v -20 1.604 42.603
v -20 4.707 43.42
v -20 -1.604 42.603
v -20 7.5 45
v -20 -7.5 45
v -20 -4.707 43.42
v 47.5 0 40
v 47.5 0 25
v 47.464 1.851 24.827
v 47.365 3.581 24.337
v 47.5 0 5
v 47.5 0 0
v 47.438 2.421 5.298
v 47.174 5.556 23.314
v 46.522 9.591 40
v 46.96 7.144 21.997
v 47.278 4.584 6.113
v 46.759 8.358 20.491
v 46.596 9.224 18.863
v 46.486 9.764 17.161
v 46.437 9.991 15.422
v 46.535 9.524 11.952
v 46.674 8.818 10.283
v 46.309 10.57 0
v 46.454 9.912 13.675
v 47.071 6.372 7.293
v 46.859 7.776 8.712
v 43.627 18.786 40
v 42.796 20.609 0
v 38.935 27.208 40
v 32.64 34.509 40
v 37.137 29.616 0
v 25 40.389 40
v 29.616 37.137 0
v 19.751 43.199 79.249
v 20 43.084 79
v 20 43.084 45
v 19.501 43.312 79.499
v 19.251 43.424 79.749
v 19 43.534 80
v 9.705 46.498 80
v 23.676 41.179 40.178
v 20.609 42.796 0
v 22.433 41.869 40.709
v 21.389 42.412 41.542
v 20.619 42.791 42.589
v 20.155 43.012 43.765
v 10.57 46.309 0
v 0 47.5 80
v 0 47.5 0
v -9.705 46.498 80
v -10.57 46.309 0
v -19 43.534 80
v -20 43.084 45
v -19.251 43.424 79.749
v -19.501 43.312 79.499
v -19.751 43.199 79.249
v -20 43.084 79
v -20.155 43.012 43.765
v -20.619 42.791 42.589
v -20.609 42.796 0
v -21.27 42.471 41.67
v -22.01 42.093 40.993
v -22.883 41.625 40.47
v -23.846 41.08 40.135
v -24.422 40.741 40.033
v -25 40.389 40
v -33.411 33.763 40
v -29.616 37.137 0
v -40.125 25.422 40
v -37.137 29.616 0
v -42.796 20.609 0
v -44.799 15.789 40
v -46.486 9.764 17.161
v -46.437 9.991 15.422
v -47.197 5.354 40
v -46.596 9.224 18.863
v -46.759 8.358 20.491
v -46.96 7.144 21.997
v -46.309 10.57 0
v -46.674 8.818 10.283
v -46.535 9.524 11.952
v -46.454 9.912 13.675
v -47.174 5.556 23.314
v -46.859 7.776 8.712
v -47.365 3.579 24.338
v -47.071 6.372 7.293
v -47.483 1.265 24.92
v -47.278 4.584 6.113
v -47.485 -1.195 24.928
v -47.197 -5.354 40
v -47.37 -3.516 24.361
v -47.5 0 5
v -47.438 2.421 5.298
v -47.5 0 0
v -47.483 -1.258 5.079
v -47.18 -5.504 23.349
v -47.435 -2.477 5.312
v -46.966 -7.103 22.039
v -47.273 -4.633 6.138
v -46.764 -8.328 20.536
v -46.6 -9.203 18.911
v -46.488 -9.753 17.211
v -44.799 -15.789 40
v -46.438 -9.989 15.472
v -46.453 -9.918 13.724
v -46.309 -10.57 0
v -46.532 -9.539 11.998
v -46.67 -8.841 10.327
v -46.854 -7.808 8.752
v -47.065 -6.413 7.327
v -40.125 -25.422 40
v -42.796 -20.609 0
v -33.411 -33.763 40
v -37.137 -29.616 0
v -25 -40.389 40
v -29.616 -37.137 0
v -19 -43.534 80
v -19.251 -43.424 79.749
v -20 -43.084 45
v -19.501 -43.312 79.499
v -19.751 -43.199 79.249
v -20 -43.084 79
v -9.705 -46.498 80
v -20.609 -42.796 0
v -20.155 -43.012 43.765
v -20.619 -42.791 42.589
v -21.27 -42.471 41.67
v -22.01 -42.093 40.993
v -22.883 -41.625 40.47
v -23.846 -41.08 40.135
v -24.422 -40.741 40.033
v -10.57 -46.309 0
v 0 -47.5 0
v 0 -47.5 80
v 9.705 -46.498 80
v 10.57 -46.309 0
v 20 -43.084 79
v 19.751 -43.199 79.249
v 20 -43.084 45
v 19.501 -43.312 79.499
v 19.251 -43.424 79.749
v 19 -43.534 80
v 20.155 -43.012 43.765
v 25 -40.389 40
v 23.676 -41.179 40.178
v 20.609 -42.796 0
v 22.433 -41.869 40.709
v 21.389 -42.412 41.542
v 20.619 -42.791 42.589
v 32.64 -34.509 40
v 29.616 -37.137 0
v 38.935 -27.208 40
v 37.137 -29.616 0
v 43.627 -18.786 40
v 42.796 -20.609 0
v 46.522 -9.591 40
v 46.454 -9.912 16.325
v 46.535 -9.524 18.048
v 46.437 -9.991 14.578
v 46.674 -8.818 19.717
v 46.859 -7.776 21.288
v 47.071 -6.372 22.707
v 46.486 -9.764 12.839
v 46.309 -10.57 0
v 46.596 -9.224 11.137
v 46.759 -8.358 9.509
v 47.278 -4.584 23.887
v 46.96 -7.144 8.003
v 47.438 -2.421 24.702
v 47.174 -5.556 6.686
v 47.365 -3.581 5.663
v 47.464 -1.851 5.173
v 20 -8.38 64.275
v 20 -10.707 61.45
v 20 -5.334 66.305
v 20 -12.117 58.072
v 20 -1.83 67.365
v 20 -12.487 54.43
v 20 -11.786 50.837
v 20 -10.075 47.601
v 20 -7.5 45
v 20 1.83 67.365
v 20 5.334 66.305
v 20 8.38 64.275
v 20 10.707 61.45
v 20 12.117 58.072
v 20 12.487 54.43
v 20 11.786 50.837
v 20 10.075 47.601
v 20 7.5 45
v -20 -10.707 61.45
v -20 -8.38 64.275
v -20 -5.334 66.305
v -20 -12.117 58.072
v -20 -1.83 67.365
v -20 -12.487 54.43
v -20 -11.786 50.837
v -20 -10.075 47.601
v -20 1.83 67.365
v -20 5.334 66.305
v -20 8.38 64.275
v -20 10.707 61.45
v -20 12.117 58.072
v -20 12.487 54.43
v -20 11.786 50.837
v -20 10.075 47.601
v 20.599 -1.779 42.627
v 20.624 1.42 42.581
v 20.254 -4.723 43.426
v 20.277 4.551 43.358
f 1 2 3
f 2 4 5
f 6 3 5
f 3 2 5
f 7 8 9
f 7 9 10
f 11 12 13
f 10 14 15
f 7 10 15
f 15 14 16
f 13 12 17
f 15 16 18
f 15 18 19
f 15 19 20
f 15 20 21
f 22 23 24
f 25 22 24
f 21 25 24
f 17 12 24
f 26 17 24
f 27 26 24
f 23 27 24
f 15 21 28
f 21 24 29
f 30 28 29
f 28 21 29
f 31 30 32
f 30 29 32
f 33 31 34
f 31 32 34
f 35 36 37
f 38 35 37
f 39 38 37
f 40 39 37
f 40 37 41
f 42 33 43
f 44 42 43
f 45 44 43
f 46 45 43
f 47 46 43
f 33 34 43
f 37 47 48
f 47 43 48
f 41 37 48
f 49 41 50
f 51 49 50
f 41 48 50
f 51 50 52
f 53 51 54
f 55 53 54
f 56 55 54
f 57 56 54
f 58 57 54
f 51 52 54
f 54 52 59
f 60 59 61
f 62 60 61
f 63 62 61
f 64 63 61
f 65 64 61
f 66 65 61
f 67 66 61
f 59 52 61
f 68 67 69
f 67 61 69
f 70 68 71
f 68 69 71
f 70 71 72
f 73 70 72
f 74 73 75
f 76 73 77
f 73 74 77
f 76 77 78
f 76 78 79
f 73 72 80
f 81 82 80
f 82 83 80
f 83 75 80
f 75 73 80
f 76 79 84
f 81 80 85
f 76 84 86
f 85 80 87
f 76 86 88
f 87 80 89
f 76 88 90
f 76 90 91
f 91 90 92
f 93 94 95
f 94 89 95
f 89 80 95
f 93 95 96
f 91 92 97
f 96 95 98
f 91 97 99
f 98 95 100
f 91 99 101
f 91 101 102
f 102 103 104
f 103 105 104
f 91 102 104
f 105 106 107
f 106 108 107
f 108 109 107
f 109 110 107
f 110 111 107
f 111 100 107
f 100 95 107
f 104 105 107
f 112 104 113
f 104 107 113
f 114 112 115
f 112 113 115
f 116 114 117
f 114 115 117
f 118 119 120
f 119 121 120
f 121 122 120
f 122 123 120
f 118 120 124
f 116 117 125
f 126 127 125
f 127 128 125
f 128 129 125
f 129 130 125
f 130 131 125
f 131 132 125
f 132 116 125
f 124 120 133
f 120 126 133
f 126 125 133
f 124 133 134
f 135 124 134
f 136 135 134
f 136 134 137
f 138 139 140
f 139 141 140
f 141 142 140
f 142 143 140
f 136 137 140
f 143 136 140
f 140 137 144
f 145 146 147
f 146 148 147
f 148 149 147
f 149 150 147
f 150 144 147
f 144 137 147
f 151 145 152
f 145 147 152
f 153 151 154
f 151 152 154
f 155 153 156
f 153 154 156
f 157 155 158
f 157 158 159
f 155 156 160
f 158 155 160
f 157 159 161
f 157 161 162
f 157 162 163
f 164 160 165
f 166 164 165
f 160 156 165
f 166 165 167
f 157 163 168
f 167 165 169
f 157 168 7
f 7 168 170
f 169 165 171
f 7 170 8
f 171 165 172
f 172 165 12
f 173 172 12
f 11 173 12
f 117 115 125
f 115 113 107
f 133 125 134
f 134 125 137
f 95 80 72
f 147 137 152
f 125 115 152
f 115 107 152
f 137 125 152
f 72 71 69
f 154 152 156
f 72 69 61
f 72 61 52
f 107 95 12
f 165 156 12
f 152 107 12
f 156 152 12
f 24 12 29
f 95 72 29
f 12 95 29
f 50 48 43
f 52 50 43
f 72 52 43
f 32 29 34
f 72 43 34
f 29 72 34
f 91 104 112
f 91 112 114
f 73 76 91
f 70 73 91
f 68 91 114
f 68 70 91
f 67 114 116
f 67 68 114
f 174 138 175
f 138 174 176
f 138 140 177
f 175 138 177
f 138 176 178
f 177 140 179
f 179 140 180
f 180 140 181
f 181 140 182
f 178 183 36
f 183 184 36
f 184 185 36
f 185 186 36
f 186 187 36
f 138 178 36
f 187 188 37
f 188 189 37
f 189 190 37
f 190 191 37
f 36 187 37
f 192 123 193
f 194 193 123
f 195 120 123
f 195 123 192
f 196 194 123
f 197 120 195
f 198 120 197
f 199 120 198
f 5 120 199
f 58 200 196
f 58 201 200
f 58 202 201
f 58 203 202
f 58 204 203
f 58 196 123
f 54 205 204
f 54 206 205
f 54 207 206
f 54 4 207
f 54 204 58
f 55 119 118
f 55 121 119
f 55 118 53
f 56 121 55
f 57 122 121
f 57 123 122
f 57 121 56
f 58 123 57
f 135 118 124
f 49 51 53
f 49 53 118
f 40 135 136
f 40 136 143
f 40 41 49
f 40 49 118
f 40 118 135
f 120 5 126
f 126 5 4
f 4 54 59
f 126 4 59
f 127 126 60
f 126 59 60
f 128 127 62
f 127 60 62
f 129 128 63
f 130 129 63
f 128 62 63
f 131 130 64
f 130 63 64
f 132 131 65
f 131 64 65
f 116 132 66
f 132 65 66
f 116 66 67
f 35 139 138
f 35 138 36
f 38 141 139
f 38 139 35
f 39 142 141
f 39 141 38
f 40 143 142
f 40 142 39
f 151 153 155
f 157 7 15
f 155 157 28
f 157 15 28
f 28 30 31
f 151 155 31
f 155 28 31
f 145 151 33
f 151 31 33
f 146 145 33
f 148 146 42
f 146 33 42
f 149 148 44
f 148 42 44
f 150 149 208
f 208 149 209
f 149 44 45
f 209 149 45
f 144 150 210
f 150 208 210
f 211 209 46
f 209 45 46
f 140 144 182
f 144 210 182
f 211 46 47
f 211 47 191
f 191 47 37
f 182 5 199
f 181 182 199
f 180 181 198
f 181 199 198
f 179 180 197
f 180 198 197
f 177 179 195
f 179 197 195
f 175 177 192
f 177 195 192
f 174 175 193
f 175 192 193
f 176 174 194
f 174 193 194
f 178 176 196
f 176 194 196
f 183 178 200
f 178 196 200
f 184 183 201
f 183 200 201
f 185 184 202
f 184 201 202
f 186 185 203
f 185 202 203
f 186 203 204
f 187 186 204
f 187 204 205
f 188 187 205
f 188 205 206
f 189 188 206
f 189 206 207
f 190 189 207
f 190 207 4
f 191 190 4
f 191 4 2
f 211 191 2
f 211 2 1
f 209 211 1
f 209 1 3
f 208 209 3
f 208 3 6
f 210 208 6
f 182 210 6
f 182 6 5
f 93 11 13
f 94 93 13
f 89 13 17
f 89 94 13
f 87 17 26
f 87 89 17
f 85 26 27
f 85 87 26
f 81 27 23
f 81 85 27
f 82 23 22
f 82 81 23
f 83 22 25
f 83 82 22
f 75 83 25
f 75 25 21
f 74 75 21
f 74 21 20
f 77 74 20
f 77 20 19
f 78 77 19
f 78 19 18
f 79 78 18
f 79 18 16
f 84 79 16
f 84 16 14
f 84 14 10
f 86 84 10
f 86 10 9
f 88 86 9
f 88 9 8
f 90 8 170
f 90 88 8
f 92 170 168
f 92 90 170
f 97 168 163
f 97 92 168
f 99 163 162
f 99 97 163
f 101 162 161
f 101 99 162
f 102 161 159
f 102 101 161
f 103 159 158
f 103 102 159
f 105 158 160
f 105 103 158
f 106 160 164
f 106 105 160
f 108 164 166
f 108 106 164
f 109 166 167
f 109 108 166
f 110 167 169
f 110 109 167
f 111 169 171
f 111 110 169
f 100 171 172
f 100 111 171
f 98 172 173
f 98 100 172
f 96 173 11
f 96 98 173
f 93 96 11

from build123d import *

# Parameters (mm, degrees)
SKETCH_1_R               = 47.5
EXTRUDE_1_DEPTH          = 80
CUT_EXTRUDE_START        = -40
CUT_EXTRUDE_1_DEPTH      = 40
FILLET_1_R               = 5
SKETCH_3_R               = 12.5
CUT_EXTRUDE_2_DEPTH      = 115.945639495
CHAMFER_1_SIZE           = 1
CUT_EXTRUDE_3_DEPTH      = 105.462912246
CUT_EXTRUDE_3_DEPTH_BACK = 105.462912246
SKETCH_4_R               = 10


with BuildPart() as part:
    # Эскиз1 → Бобышка-Вытянуть1 (new body)
    with BuildSketch(Plane.XY):
        Circle(SKETCH_1_R)
    extrude(amount=EXTRUDE_1_DEPTH)

    # Эскиз2 → Вырез-Вытянуть1 (cut)
    with BuildSketch(Plane.XY.offset(80).offset(CUT_EXTRUDE_START)):
        with BuildLine():
            Line((20, -43.084219849), (20, 43.084219849))
            ThreePointArc((20, 43.084219849), (47.5, 0), (20, -43.084219849))
        make_face()
        with BuildLine():
            Line((-20, -43.084219849), (-20, 43.084219849))
            ThreePointArc((-20, 43.084219849), (-47.5, 0), (-20, -43.084219849))
        make_face()
    extrude(amount=CUT_EXTRUDE_1_DEPTH, mode=Mode.SUBTRACT)

    # Скругление1
    fillet_1_edges = [part.edges().sort_by_distance(p)[0] for p in [
        (-20, 0, 40),
        (20, 0, 40),
    ]]
    fillet(fillet_1_edges, radius=FILLET_1_R)

    # Эскиз3 → Вырез-Вытянуть2 (cut, through all)
    with BuildSketch(Plane.ZY.offset(20)):
        with Locations(Location((55, 0, 0), (0, 0, 216.869897646))):
            Circle(SKETCH_3_R)
    extrude(amount=-CUT_EXTRUDE_2_DEPTH, mode=Mode.SUBTRACT)

    # Фаска1
    chamfer_1_edges = [part.edges().sort_by_distance(p)[0] for p in [
        (-20, 0, 80),
        (20, 0, 80),
    ]]
    chamfer(chamfer_1_edges, length=CHAMFER_1_SIZE)

    # Эскиз4 → Вырез-Вытянуть3 (cut, two sides: drawn at the far end of the back side and taken through both)
    with BuildSketch(Plane(origin=(0, 0, 0), x_dir=(0, 0, -1), z_dir=(1, 0, 0)).offset(-CUT_EXTRUDE_3_DEPTH_BACK)):
        with Locations((-15, 0)):
            Circle(SKETCH_4_R)
    extrude(amount=CUT_EXTRUDE_3_DEPTH + CUT_EXTRUDE_3_DEPTH_BACK, mode=Mode.SUBTRACT)


solid = part.part
